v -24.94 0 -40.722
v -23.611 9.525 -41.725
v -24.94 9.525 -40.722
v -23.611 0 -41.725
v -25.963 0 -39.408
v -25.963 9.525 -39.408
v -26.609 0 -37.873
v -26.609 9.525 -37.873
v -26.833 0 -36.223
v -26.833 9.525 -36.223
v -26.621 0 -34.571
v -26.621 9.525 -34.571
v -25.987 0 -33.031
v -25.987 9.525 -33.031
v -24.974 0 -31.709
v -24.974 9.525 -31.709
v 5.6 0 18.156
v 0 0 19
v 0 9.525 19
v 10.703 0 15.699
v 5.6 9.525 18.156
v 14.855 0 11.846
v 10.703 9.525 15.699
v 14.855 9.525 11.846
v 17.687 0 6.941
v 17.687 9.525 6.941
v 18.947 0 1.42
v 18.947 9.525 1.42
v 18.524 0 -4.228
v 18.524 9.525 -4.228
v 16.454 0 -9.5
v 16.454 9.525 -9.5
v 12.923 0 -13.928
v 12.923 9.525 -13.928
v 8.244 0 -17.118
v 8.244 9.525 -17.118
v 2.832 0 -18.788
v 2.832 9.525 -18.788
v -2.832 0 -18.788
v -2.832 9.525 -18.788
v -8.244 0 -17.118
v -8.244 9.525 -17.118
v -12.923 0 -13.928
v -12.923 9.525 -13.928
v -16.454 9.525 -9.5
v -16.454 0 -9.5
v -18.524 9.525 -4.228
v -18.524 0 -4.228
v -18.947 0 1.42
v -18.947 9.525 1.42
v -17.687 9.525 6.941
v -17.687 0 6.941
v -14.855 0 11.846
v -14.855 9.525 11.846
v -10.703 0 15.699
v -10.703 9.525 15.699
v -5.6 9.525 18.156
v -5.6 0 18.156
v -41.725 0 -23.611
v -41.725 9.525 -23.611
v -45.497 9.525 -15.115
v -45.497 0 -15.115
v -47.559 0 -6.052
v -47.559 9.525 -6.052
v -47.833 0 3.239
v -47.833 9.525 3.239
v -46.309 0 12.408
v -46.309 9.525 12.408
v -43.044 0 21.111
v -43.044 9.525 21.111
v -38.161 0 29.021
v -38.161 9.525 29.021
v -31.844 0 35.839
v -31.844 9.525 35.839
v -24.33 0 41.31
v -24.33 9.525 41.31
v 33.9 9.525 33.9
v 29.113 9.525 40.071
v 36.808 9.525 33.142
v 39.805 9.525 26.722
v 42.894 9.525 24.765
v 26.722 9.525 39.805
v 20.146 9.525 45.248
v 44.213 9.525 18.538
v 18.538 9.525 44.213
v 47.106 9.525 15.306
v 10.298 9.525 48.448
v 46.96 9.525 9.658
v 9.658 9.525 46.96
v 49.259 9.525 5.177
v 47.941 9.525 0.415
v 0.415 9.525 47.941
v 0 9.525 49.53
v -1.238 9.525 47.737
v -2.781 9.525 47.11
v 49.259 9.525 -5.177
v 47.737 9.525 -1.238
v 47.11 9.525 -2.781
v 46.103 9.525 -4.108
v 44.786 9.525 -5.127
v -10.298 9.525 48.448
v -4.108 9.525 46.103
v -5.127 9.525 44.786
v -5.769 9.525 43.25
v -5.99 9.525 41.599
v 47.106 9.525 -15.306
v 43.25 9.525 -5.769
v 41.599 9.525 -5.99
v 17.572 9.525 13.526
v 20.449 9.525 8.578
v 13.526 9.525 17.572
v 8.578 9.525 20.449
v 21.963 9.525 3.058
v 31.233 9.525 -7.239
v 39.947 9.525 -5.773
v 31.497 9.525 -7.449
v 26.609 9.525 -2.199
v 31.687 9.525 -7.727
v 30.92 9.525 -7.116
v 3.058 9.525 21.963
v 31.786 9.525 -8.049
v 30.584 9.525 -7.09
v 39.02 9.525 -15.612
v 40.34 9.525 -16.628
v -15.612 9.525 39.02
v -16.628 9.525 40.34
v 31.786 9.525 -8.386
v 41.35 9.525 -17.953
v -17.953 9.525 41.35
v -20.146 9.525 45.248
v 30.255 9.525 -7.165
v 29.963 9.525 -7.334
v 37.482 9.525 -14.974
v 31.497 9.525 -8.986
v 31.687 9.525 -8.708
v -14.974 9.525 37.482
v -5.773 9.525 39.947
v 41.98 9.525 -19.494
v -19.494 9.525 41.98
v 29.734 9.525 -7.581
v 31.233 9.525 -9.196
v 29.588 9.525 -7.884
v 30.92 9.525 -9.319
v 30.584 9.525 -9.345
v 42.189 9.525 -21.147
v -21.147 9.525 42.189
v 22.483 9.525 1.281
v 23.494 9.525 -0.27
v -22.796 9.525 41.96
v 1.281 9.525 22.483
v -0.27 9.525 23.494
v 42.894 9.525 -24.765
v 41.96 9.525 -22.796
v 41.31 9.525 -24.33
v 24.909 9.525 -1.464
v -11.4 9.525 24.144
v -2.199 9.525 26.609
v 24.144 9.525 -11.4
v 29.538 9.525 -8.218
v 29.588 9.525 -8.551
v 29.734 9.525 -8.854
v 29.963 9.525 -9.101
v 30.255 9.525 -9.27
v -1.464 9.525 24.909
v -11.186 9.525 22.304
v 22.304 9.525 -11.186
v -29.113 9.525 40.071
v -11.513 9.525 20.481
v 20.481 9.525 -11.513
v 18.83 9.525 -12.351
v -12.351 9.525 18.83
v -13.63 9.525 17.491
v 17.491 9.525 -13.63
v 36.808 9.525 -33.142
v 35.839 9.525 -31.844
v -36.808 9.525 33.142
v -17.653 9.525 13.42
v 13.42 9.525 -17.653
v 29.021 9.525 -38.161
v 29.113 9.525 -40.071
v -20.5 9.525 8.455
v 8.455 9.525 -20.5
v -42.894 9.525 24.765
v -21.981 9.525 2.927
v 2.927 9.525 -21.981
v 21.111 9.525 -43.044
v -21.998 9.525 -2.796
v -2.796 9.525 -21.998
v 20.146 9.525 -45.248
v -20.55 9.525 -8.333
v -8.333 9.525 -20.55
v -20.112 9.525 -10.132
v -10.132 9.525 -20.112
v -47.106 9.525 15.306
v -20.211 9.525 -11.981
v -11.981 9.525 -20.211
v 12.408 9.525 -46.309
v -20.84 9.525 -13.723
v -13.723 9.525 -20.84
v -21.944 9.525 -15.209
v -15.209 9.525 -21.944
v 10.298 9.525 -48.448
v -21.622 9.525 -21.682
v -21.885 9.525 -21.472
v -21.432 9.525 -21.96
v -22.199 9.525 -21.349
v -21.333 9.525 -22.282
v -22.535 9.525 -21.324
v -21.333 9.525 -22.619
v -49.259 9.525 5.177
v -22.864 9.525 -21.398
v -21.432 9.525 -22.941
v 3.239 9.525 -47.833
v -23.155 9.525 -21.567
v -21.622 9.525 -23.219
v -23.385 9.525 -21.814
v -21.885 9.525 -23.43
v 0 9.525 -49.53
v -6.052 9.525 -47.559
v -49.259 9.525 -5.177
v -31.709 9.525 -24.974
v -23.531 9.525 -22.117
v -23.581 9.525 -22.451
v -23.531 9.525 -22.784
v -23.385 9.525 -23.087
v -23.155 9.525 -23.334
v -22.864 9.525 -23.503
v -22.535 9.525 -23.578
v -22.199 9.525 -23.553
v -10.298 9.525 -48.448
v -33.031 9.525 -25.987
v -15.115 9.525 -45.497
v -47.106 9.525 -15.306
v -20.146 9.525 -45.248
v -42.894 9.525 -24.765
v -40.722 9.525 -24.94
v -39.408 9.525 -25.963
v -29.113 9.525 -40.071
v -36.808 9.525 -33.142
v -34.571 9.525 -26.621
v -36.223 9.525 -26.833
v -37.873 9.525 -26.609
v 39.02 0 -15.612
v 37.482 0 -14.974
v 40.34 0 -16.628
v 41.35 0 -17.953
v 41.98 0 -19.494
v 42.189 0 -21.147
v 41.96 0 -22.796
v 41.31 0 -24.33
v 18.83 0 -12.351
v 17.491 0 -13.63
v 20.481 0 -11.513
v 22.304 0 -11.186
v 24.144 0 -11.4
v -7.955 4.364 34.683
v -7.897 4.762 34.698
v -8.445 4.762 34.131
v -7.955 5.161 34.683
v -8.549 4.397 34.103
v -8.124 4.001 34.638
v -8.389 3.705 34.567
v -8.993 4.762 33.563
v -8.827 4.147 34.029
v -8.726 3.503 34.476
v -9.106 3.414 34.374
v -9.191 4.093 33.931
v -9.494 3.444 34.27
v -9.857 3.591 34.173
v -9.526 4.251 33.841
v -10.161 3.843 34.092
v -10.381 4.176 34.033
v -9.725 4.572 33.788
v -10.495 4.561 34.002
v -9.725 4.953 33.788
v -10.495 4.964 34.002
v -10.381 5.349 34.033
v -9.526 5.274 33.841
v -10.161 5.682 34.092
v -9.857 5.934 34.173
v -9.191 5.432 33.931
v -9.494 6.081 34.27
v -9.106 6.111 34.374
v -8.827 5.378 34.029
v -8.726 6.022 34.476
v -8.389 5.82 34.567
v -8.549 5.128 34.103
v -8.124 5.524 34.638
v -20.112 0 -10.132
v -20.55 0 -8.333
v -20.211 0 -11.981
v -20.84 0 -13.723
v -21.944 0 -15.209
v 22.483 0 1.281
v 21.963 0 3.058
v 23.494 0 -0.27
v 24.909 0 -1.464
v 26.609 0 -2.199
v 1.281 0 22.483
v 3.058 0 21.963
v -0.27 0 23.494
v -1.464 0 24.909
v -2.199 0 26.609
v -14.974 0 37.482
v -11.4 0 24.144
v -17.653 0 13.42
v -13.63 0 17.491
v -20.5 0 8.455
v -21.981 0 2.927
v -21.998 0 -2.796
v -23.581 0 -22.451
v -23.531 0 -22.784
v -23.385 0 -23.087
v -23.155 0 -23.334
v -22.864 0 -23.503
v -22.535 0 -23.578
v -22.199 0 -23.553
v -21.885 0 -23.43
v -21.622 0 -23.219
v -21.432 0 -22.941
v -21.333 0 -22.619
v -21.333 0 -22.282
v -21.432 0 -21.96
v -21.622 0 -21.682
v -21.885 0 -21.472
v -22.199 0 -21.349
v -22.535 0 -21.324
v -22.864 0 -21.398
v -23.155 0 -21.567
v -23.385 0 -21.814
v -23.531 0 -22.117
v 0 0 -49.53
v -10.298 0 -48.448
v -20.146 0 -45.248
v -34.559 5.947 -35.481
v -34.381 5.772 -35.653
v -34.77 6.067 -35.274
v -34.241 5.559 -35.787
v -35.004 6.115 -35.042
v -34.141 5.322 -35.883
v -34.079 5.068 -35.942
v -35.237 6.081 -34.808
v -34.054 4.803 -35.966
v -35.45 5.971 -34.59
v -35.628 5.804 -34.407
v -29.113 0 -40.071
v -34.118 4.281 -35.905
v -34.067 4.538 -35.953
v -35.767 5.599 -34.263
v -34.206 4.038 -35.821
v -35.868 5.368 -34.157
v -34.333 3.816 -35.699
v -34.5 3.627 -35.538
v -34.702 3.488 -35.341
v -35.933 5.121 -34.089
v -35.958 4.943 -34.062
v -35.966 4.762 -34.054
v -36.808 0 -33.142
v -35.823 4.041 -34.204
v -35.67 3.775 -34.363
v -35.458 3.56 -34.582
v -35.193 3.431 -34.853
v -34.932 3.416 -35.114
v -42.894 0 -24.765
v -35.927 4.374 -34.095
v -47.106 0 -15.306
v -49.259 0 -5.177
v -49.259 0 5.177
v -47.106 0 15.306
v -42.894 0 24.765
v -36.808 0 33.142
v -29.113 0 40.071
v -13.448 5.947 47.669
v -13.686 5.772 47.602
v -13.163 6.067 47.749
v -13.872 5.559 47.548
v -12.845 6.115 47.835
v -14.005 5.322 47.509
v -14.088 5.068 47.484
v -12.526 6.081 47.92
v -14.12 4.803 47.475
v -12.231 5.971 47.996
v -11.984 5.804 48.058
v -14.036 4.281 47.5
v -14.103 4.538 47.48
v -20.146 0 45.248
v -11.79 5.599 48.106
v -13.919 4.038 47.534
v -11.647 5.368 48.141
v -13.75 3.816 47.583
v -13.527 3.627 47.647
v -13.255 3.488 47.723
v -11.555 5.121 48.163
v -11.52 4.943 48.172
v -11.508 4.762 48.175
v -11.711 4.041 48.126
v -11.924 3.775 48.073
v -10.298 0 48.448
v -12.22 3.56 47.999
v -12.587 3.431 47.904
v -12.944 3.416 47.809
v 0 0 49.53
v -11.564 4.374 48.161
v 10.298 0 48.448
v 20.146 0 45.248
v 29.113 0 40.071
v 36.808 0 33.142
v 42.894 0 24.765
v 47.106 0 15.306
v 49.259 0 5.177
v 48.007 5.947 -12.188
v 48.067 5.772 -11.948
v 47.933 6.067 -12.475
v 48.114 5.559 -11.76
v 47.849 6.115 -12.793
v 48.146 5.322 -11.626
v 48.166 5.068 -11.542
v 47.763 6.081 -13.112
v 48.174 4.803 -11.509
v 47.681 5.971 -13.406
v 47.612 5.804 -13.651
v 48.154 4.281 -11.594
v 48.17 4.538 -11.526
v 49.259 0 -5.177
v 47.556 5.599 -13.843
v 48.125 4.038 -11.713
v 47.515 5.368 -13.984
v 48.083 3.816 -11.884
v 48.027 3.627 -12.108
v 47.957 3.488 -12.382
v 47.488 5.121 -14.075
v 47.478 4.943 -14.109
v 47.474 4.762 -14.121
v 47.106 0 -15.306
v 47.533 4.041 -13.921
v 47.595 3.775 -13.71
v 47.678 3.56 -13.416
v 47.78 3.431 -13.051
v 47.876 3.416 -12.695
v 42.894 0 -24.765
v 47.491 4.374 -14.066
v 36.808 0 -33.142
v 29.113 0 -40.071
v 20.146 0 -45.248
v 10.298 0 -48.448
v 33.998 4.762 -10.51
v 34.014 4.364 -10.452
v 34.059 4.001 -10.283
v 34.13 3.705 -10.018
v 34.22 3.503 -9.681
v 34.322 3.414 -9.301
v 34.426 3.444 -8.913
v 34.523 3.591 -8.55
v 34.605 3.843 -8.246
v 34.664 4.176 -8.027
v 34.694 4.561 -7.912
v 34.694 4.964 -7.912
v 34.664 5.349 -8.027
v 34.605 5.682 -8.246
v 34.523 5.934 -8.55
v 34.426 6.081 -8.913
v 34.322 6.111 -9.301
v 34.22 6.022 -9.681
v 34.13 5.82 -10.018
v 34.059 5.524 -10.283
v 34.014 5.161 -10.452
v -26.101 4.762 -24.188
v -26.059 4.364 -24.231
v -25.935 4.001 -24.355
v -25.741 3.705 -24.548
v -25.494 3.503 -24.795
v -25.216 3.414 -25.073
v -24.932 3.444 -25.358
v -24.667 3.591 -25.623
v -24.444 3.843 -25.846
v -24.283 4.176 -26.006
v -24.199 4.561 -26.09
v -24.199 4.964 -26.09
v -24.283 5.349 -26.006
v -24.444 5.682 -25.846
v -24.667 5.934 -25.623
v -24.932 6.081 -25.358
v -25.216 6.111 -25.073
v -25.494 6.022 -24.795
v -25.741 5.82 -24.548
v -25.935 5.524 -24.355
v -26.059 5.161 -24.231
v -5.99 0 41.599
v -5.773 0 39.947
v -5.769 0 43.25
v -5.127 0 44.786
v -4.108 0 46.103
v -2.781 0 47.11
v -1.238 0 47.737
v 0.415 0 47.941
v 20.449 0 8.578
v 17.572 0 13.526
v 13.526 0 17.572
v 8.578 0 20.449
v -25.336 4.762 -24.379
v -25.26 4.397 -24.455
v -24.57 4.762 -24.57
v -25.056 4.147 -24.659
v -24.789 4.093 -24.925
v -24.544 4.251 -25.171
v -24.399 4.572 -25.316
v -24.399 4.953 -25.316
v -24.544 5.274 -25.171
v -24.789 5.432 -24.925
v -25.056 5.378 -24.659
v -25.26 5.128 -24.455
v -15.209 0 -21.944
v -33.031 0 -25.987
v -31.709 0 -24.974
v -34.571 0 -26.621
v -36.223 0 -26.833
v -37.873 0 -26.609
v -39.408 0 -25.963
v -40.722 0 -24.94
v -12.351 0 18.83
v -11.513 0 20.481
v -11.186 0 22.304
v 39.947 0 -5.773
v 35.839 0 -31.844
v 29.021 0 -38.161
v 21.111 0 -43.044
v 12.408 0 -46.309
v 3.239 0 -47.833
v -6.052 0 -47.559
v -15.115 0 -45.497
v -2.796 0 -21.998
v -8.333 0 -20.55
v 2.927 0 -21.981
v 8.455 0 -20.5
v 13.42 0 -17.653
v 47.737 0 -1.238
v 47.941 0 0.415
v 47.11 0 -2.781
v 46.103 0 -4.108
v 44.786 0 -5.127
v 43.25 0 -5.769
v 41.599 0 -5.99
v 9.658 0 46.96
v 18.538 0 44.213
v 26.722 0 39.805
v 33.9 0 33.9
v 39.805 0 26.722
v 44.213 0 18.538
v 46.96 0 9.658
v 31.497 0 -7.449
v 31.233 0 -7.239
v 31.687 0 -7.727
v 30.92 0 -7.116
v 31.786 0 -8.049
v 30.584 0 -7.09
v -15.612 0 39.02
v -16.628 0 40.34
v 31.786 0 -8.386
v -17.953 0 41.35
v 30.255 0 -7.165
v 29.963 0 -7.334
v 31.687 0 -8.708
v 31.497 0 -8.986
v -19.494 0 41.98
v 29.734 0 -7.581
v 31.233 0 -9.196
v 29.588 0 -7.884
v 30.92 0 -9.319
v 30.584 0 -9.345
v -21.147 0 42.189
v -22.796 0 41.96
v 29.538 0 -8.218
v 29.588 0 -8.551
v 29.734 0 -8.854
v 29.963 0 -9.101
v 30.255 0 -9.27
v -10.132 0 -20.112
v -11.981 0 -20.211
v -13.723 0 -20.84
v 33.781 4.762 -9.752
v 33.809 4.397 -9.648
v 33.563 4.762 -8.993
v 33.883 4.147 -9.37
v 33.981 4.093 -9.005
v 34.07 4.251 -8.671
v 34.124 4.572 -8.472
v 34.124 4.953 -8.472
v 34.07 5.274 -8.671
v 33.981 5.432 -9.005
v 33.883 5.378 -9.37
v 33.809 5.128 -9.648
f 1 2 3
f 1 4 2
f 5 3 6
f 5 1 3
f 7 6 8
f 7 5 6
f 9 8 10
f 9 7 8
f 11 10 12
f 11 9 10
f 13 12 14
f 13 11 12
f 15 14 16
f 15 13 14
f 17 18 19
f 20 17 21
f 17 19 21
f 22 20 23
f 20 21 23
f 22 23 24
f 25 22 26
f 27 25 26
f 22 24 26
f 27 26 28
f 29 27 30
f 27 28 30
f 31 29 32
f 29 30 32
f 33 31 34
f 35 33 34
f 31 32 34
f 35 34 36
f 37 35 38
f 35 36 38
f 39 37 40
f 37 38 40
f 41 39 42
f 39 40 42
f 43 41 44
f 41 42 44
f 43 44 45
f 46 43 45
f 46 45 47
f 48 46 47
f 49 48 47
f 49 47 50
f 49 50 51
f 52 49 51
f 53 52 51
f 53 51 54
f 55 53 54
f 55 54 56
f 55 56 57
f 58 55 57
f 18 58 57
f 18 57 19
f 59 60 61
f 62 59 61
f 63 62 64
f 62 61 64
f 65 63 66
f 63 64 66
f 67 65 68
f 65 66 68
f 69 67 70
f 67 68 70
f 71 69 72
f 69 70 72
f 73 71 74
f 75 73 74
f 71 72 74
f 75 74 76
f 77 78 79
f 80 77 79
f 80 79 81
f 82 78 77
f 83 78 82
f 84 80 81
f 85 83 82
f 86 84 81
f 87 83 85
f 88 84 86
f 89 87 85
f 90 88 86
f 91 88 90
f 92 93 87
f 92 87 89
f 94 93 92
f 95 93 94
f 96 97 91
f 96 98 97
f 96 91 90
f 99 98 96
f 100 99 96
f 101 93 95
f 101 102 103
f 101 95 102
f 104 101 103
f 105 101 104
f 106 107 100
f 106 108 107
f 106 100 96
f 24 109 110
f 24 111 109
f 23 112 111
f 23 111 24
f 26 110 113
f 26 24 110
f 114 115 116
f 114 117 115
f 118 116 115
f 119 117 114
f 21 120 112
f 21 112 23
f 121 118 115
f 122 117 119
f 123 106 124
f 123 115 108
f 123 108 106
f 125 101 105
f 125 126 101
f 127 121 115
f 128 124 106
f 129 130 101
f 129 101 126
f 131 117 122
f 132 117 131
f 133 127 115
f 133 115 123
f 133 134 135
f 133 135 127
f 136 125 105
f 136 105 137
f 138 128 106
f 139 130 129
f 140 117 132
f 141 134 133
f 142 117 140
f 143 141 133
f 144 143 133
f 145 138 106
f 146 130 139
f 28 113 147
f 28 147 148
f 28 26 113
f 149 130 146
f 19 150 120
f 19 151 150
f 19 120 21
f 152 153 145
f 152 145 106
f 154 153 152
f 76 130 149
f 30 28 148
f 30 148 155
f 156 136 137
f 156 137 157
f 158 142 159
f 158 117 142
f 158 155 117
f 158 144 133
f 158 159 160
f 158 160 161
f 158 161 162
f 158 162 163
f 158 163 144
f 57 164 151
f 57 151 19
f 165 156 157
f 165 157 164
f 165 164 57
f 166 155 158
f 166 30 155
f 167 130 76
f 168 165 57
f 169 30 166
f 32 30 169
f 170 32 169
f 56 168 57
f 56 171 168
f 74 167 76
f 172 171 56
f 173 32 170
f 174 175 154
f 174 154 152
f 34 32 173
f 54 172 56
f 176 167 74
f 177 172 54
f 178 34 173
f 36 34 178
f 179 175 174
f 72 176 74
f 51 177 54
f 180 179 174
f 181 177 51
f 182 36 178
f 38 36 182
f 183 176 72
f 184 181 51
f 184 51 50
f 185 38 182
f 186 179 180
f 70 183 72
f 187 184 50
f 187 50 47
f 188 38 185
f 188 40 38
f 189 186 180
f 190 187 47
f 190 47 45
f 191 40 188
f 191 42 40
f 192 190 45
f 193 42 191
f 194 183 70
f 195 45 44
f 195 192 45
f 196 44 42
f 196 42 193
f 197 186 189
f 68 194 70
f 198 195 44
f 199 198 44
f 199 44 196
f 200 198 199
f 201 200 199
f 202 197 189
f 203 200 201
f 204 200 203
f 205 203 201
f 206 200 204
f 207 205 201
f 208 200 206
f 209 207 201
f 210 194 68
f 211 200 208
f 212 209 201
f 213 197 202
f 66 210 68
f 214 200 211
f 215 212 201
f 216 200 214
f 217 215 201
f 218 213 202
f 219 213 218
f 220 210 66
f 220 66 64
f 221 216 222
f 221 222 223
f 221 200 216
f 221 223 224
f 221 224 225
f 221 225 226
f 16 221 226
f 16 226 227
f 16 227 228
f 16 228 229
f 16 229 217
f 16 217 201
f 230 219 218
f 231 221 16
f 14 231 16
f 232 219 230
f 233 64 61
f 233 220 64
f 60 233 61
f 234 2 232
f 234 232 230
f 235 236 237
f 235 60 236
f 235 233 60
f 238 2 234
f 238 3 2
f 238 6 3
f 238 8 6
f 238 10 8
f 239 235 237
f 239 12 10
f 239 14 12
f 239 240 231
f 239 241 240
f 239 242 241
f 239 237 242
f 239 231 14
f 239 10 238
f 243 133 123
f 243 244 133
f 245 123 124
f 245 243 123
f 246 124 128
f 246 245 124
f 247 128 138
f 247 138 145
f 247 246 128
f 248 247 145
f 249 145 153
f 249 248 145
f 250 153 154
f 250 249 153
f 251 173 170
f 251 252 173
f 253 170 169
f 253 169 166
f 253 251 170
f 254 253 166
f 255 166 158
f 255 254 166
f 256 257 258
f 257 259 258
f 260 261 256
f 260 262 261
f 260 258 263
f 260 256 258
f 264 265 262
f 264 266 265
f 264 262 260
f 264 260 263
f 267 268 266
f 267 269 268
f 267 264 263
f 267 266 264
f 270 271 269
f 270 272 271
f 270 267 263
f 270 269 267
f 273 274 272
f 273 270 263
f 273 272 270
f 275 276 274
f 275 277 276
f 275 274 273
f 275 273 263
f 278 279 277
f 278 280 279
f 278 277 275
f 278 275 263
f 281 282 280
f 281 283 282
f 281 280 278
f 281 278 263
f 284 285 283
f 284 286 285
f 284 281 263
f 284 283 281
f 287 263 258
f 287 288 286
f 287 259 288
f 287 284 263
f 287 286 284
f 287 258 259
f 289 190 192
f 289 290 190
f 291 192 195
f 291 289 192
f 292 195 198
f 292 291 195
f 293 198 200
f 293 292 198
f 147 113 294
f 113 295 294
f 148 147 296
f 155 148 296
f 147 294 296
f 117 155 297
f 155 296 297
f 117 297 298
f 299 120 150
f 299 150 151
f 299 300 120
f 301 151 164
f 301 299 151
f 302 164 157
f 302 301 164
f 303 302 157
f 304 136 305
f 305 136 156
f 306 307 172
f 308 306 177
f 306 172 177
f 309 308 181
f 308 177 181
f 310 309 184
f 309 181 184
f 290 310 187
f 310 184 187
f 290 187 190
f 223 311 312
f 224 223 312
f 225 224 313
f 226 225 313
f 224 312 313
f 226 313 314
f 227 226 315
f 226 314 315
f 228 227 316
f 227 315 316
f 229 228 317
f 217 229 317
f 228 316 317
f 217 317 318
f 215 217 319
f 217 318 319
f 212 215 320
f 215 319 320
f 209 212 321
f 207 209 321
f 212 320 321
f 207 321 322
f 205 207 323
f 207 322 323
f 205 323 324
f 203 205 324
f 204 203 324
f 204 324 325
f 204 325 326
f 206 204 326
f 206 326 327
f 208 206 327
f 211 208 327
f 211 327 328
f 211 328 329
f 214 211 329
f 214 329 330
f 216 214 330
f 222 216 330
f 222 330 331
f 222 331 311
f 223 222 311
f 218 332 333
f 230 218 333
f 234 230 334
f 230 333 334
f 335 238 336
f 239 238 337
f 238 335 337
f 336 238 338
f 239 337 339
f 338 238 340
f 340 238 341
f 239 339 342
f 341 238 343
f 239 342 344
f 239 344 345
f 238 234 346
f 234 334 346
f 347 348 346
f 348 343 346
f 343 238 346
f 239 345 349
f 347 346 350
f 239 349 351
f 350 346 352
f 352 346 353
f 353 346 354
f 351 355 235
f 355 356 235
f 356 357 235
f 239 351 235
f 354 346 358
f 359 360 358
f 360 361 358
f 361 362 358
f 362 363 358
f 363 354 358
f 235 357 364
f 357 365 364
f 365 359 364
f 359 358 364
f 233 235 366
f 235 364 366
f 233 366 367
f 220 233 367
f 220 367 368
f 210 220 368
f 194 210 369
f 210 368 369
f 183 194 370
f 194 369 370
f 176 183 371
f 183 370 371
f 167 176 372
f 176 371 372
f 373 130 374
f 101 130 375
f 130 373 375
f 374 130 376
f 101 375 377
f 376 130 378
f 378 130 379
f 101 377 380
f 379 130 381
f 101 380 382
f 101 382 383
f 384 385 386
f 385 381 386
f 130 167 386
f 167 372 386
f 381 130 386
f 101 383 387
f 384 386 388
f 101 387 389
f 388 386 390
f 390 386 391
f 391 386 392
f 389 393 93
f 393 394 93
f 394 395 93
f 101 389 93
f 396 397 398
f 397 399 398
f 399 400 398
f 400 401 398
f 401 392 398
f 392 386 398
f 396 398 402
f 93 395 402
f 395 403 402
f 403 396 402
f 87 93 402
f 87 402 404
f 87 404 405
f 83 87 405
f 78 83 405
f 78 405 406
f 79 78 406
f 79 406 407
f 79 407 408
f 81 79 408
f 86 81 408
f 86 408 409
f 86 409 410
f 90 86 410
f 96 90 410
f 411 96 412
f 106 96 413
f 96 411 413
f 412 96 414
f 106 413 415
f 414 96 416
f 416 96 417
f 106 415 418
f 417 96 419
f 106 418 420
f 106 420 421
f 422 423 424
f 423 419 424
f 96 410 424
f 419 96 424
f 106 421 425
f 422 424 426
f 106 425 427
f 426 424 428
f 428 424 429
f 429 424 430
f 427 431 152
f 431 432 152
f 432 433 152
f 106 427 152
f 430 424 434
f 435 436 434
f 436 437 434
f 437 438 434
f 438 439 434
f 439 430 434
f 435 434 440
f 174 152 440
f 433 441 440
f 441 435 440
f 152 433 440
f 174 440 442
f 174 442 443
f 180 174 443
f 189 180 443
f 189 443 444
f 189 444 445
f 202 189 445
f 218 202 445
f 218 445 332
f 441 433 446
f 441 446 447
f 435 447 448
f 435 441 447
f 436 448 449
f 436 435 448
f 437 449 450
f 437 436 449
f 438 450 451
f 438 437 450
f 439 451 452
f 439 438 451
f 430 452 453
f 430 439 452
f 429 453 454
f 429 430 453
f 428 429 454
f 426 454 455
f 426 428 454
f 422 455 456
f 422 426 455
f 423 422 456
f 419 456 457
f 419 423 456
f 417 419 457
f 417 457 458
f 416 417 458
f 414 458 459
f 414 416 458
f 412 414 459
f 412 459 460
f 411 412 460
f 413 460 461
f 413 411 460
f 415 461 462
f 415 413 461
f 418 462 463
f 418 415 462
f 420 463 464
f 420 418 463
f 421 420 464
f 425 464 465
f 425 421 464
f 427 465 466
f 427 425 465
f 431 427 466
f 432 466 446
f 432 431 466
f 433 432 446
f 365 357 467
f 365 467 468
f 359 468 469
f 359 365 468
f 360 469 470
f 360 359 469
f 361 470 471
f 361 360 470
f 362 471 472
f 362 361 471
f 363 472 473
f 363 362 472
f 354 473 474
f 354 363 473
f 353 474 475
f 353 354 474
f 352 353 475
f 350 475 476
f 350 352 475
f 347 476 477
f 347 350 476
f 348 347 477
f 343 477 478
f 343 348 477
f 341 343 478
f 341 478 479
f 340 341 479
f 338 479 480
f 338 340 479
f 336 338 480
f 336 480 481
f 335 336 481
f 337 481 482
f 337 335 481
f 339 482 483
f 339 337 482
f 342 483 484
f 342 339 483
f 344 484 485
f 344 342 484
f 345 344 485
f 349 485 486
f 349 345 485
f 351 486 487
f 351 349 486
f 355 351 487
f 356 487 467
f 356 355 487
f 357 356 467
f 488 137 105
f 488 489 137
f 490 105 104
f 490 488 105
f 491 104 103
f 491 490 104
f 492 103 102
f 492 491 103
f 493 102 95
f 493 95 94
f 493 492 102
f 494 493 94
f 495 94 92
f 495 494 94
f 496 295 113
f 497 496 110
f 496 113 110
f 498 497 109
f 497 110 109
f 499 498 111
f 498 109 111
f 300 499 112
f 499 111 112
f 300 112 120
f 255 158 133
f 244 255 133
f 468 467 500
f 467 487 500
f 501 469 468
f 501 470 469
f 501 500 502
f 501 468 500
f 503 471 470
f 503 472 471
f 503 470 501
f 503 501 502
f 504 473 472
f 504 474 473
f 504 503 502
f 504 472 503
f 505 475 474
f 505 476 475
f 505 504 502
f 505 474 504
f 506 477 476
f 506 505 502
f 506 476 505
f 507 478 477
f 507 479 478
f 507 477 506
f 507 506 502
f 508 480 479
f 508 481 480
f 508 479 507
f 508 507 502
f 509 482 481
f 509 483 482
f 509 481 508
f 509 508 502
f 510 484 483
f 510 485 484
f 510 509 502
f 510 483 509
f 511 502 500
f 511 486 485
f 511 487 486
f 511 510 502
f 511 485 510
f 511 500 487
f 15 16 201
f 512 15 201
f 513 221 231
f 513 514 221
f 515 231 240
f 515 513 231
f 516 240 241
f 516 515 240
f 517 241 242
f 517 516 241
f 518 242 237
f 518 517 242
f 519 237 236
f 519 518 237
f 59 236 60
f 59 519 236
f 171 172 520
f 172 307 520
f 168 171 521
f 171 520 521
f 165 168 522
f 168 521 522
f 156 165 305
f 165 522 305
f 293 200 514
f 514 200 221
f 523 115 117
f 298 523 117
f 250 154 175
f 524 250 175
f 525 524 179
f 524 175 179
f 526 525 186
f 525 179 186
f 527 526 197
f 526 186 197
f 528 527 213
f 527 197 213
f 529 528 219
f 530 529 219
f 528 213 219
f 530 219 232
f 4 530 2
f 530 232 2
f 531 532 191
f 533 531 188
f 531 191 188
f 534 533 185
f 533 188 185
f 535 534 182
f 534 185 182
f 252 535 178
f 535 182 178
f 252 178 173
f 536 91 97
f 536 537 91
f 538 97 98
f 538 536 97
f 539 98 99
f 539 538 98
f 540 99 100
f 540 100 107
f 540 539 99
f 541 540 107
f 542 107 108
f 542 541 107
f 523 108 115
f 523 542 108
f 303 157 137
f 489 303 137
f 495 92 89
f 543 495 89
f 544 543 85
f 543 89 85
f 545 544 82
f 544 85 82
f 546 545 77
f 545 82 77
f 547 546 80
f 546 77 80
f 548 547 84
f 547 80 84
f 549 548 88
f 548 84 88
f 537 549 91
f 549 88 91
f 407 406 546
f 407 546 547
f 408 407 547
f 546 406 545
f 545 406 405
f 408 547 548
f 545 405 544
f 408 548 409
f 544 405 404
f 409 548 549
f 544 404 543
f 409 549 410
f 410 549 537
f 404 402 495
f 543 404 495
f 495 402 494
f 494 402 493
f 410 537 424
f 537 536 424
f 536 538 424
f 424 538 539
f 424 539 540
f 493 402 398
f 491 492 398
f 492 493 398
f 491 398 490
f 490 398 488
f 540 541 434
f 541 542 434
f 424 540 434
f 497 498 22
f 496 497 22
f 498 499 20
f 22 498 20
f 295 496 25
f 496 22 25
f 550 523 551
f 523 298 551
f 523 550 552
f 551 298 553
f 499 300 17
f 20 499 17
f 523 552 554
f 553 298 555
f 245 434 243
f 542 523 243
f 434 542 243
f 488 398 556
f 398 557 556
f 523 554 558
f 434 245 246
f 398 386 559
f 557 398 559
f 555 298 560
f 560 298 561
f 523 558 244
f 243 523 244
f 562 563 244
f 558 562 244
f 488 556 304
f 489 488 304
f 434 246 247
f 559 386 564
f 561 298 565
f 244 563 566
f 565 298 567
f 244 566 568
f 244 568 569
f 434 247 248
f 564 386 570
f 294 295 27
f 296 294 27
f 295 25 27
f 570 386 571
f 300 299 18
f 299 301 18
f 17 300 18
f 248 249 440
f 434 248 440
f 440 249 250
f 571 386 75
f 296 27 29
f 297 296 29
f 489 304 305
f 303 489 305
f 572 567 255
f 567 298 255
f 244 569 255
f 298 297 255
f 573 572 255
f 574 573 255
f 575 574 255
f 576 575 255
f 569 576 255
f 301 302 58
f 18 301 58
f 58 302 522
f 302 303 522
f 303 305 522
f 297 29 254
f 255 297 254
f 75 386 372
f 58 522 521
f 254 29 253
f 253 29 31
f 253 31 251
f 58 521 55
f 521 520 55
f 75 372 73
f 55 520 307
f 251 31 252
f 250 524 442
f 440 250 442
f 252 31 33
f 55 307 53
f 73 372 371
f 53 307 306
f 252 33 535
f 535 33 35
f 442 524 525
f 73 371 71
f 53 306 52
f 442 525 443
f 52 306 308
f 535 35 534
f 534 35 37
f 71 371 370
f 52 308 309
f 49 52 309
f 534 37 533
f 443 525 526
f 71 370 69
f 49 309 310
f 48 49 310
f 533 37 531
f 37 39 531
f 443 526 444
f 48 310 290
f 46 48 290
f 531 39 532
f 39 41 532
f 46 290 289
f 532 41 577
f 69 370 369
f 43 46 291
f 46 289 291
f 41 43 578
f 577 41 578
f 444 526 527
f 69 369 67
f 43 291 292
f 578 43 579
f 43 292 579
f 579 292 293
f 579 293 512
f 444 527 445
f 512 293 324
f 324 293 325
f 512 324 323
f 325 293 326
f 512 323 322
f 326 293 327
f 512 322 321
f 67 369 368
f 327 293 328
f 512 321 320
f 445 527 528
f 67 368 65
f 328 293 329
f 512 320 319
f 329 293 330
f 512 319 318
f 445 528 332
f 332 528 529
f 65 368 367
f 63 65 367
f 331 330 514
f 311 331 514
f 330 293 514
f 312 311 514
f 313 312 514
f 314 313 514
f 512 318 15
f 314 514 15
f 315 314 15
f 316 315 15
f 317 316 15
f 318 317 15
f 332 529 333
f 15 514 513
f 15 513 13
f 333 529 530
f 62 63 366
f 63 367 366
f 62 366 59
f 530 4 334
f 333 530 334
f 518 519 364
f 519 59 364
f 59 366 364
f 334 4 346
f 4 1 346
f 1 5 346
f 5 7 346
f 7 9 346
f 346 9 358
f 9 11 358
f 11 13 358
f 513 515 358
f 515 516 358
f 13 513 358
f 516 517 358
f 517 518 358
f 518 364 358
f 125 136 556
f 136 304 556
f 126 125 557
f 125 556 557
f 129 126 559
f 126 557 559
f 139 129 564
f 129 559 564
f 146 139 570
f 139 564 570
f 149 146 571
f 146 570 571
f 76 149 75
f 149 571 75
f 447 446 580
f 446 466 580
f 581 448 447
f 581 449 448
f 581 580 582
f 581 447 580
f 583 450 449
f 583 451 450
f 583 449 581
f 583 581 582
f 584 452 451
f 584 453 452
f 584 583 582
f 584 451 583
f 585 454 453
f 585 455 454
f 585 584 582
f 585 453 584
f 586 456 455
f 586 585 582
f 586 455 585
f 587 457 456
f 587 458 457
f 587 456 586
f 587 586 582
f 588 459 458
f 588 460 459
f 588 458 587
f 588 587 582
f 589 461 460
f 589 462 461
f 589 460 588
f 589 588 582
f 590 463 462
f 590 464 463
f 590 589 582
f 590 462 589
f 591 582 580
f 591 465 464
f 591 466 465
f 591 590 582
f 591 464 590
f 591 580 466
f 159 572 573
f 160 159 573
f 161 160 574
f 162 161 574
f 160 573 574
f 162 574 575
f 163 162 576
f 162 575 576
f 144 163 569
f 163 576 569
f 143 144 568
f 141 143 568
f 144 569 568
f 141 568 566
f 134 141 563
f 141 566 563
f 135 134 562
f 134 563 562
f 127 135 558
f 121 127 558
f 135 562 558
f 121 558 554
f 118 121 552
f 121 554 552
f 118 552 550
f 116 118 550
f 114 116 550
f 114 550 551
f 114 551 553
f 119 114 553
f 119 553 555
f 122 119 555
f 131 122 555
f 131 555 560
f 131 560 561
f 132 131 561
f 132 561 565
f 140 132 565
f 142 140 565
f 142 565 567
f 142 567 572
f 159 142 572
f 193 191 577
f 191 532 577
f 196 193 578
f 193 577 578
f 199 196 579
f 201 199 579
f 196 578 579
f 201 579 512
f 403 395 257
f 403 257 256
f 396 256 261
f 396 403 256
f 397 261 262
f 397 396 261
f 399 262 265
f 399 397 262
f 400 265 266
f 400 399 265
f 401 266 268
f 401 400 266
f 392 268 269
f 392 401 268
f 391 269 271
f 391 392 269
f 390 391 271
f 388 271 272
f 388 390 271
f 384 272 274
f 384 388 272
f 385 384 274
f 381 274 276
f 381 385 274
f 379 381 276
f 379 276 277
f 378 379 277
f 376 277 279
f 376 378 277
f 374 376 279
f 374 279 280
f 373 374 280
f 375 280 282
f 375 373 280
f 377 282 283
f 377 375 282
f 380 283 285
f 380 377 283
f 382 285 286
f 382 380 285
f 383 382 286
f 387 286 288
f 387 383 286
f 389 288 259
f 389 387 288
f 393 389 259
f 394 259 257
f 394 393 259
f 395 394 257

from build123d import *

# Parameters (mm, degrees)
SKETCH2_R                = 49.53
BOSS_EXTRUDE1_DEPTH      = 9.525
CUT_EXTRUDE1_REACH       = 72.691
SKETCH3_R                = 19
CIRPATTERN1_COUNT        = 3
CUT_EXTRUDE3_REACH       = 72.691
FILLET2_R                = 6.35
CIRPATTERN2_COUNT        = 3
FILLET2_OF_CIRPATTERN2_R = 6.35
F_4_40_TAPPED_HOLE1_D    = 2.2606


with BuildPart() as part:
    # Sketch2 → Boss-Extrude1 (new body)
    with BuildSketch(Plane(origin=(0, 0, 0), x_dir=(1, 0, 0), z_dir=(0, 1, 0))):
        with Locations(Location((0, 0, 0), (0, 0, 90))):
            Circle(SKETCH2_R)
    extrude(amount=BOSS_EXTRUDE1_DEPTH)

    # Sketch3 → Cut-Extrude1 (cut, up to next)
    with BuildSketch(Plane(origin=(0, 9.525, 0), x_dir=(1, 0, 0), z_dir=(0, 1, 0)), mode=Mode.PRIVATE) as cut_extrude1_sk1:
        with Locations(Location((0, 0, 0), (0, 0, 270))):
            Circle(SKETCH3_R)
    cut_extrude1_tool1 = extrude(cut_extrude1_sk1.sketch, amount=-CUT_EXTRUDE1_REACH, mode=Mode.PRIVATE) & part.part
    add(cut_extrude1_tool1.solids().sort_by_distance((0, 9.525, 0))[0], mode=Mode.SUBTRACT)

    # Sketch7 → Tap Drill for #6-32 Tap1 (revolve, cut)
    with BuildSketch(Plane(origin=(-35.022998872, 4.7625, -35.022998872), x_dir=(-0.7071067811865475, 0, 0.7071067811865476), z_dir=(0, 1, 0))):
        Polygon((0, 0), (0, 14.78269403), (1.35255, 13.97), (1.35255, 0), align=None)
    tap_drill_for_6_32_tap1 = revolve(axis=Axis((-41.488783279, 4.7625, -41.488783279), (0.7071067811865474, 0, 0.7071067811865477)), mode=Mode.SUBTRACT)

    # CirPattern1: Tap Drill for #6-32 Tap1 ×3 about axis
    cirpattern1_axis = Axis((0, -0.001, 0), (0, 1, 0))
    for i in range(1, CIRPATTERN1_COUNT):
        add(tap_drill_for_6_32_tap1.rotate(cirpattern1_axis, i * 360 / CIRPATTERN1_COUNT), mode=Mode.SUBTRACT)

    # Sketch8 → Cut-Extrude3 (cut, up to next)
    with BuildSketch(Plane(origin=(0, 9.525, 0), x_dir=(1, 0, 0), z_dir=(0, 1, 0)), mode=Mode.PRIVATE) as cut_extrude3_sk1:
        with BuildLine():
            Line((-30.365191417, 37.100383508), (-11.946600289, 18.68179238))
            ThreePointArc((-11.946600289, 18.68179238), (5.739312325, 21.419405198), (19.686955529, 10.205606645))
            Line((19.686955529, 10.205606645), (44.847218912, 16.947278899))
            ThreePointArc((44.847218912, 16.947278899), (12.40843207, 46.308898927), (-30.365191417, 37.100383508))
        make_face()
    cut_extrude3_tool1 = extrude(cut_extrude3_sk1.sketch, amount=-CUT_EXTRUDE3_REACH, mode=Mode.PRIVATE) & part.part
    cut_extrude3 = cut_extrude3_tool1.solids().sort_by_distance((8.258895, 9.525, -30.822615))[0]
    add(cut_extrude3, mode=Mode.SUBTRACT)

    # Fillet2
    fillet2_edges = [part.edges().sort_by_distance(p)[0] for p in [
        (-30.365191417, 4.7625, -37.100383508),
        (44.847218912, 4.7625, -16.947278899),
        (19.686955529, 4.7625, -10.205606645),
        (-11.946600289, 4.7625, -18.68179238),
    ]]
    fillet(fillet2_edges, radius=FILLET2_R)

    # CirPattern2: Cut-Extrude3 ×3 about axis
    cirpattern2_axis = Axis((0, 0, 0), (0, 1, 0))
    for i in range(1, CIRPATTERN2_COUNT):
        add(cut_extrude3.rotate(cirpattern2_axis, i * 360 / CIRPATTERN2_COUNT), mode=Mode.SUBTRACT)

    # Fillet2 of CirPattern2
    fillet2_of_cirpattern2_edges = [part.edges().sort_by_distance(p)[0] for p in [
        (-16.947278899, 4.7625, 44.847218912),
        (-37.100383508, 4.7625, -30.365191417),
        (-18.68179238, 4.7625, -11.946600289),
        (-10.205606645, 4.7625, 19.686955529),
        (47.312470317, 4.7625, -7.746835404),
        (-7.746835404, 4.7625, 47.312470317),
        (-1.005163149, 4.7625, 22.152206934),
        (22.152206934, 4.7625, -1.005163149),
    ]]
    fillet(fillet2_of_cirpattern2_edges, radius=FILLET2_OF_CIRPATTERN2_R)

    # #4-40 Tapped Hole1 (through all)
    with Locations(Plane(origin=(0, 9.525, 0), x_dir=(1, 0, 0), z_dir=(0, 1, 0))):
        with Locations((30.668144985, 8.217504682), (-22.450640303, 22.450640303)):
            Hole(F_4_40_TAPPED_HOLE1_D / 2)


solid = part.part
